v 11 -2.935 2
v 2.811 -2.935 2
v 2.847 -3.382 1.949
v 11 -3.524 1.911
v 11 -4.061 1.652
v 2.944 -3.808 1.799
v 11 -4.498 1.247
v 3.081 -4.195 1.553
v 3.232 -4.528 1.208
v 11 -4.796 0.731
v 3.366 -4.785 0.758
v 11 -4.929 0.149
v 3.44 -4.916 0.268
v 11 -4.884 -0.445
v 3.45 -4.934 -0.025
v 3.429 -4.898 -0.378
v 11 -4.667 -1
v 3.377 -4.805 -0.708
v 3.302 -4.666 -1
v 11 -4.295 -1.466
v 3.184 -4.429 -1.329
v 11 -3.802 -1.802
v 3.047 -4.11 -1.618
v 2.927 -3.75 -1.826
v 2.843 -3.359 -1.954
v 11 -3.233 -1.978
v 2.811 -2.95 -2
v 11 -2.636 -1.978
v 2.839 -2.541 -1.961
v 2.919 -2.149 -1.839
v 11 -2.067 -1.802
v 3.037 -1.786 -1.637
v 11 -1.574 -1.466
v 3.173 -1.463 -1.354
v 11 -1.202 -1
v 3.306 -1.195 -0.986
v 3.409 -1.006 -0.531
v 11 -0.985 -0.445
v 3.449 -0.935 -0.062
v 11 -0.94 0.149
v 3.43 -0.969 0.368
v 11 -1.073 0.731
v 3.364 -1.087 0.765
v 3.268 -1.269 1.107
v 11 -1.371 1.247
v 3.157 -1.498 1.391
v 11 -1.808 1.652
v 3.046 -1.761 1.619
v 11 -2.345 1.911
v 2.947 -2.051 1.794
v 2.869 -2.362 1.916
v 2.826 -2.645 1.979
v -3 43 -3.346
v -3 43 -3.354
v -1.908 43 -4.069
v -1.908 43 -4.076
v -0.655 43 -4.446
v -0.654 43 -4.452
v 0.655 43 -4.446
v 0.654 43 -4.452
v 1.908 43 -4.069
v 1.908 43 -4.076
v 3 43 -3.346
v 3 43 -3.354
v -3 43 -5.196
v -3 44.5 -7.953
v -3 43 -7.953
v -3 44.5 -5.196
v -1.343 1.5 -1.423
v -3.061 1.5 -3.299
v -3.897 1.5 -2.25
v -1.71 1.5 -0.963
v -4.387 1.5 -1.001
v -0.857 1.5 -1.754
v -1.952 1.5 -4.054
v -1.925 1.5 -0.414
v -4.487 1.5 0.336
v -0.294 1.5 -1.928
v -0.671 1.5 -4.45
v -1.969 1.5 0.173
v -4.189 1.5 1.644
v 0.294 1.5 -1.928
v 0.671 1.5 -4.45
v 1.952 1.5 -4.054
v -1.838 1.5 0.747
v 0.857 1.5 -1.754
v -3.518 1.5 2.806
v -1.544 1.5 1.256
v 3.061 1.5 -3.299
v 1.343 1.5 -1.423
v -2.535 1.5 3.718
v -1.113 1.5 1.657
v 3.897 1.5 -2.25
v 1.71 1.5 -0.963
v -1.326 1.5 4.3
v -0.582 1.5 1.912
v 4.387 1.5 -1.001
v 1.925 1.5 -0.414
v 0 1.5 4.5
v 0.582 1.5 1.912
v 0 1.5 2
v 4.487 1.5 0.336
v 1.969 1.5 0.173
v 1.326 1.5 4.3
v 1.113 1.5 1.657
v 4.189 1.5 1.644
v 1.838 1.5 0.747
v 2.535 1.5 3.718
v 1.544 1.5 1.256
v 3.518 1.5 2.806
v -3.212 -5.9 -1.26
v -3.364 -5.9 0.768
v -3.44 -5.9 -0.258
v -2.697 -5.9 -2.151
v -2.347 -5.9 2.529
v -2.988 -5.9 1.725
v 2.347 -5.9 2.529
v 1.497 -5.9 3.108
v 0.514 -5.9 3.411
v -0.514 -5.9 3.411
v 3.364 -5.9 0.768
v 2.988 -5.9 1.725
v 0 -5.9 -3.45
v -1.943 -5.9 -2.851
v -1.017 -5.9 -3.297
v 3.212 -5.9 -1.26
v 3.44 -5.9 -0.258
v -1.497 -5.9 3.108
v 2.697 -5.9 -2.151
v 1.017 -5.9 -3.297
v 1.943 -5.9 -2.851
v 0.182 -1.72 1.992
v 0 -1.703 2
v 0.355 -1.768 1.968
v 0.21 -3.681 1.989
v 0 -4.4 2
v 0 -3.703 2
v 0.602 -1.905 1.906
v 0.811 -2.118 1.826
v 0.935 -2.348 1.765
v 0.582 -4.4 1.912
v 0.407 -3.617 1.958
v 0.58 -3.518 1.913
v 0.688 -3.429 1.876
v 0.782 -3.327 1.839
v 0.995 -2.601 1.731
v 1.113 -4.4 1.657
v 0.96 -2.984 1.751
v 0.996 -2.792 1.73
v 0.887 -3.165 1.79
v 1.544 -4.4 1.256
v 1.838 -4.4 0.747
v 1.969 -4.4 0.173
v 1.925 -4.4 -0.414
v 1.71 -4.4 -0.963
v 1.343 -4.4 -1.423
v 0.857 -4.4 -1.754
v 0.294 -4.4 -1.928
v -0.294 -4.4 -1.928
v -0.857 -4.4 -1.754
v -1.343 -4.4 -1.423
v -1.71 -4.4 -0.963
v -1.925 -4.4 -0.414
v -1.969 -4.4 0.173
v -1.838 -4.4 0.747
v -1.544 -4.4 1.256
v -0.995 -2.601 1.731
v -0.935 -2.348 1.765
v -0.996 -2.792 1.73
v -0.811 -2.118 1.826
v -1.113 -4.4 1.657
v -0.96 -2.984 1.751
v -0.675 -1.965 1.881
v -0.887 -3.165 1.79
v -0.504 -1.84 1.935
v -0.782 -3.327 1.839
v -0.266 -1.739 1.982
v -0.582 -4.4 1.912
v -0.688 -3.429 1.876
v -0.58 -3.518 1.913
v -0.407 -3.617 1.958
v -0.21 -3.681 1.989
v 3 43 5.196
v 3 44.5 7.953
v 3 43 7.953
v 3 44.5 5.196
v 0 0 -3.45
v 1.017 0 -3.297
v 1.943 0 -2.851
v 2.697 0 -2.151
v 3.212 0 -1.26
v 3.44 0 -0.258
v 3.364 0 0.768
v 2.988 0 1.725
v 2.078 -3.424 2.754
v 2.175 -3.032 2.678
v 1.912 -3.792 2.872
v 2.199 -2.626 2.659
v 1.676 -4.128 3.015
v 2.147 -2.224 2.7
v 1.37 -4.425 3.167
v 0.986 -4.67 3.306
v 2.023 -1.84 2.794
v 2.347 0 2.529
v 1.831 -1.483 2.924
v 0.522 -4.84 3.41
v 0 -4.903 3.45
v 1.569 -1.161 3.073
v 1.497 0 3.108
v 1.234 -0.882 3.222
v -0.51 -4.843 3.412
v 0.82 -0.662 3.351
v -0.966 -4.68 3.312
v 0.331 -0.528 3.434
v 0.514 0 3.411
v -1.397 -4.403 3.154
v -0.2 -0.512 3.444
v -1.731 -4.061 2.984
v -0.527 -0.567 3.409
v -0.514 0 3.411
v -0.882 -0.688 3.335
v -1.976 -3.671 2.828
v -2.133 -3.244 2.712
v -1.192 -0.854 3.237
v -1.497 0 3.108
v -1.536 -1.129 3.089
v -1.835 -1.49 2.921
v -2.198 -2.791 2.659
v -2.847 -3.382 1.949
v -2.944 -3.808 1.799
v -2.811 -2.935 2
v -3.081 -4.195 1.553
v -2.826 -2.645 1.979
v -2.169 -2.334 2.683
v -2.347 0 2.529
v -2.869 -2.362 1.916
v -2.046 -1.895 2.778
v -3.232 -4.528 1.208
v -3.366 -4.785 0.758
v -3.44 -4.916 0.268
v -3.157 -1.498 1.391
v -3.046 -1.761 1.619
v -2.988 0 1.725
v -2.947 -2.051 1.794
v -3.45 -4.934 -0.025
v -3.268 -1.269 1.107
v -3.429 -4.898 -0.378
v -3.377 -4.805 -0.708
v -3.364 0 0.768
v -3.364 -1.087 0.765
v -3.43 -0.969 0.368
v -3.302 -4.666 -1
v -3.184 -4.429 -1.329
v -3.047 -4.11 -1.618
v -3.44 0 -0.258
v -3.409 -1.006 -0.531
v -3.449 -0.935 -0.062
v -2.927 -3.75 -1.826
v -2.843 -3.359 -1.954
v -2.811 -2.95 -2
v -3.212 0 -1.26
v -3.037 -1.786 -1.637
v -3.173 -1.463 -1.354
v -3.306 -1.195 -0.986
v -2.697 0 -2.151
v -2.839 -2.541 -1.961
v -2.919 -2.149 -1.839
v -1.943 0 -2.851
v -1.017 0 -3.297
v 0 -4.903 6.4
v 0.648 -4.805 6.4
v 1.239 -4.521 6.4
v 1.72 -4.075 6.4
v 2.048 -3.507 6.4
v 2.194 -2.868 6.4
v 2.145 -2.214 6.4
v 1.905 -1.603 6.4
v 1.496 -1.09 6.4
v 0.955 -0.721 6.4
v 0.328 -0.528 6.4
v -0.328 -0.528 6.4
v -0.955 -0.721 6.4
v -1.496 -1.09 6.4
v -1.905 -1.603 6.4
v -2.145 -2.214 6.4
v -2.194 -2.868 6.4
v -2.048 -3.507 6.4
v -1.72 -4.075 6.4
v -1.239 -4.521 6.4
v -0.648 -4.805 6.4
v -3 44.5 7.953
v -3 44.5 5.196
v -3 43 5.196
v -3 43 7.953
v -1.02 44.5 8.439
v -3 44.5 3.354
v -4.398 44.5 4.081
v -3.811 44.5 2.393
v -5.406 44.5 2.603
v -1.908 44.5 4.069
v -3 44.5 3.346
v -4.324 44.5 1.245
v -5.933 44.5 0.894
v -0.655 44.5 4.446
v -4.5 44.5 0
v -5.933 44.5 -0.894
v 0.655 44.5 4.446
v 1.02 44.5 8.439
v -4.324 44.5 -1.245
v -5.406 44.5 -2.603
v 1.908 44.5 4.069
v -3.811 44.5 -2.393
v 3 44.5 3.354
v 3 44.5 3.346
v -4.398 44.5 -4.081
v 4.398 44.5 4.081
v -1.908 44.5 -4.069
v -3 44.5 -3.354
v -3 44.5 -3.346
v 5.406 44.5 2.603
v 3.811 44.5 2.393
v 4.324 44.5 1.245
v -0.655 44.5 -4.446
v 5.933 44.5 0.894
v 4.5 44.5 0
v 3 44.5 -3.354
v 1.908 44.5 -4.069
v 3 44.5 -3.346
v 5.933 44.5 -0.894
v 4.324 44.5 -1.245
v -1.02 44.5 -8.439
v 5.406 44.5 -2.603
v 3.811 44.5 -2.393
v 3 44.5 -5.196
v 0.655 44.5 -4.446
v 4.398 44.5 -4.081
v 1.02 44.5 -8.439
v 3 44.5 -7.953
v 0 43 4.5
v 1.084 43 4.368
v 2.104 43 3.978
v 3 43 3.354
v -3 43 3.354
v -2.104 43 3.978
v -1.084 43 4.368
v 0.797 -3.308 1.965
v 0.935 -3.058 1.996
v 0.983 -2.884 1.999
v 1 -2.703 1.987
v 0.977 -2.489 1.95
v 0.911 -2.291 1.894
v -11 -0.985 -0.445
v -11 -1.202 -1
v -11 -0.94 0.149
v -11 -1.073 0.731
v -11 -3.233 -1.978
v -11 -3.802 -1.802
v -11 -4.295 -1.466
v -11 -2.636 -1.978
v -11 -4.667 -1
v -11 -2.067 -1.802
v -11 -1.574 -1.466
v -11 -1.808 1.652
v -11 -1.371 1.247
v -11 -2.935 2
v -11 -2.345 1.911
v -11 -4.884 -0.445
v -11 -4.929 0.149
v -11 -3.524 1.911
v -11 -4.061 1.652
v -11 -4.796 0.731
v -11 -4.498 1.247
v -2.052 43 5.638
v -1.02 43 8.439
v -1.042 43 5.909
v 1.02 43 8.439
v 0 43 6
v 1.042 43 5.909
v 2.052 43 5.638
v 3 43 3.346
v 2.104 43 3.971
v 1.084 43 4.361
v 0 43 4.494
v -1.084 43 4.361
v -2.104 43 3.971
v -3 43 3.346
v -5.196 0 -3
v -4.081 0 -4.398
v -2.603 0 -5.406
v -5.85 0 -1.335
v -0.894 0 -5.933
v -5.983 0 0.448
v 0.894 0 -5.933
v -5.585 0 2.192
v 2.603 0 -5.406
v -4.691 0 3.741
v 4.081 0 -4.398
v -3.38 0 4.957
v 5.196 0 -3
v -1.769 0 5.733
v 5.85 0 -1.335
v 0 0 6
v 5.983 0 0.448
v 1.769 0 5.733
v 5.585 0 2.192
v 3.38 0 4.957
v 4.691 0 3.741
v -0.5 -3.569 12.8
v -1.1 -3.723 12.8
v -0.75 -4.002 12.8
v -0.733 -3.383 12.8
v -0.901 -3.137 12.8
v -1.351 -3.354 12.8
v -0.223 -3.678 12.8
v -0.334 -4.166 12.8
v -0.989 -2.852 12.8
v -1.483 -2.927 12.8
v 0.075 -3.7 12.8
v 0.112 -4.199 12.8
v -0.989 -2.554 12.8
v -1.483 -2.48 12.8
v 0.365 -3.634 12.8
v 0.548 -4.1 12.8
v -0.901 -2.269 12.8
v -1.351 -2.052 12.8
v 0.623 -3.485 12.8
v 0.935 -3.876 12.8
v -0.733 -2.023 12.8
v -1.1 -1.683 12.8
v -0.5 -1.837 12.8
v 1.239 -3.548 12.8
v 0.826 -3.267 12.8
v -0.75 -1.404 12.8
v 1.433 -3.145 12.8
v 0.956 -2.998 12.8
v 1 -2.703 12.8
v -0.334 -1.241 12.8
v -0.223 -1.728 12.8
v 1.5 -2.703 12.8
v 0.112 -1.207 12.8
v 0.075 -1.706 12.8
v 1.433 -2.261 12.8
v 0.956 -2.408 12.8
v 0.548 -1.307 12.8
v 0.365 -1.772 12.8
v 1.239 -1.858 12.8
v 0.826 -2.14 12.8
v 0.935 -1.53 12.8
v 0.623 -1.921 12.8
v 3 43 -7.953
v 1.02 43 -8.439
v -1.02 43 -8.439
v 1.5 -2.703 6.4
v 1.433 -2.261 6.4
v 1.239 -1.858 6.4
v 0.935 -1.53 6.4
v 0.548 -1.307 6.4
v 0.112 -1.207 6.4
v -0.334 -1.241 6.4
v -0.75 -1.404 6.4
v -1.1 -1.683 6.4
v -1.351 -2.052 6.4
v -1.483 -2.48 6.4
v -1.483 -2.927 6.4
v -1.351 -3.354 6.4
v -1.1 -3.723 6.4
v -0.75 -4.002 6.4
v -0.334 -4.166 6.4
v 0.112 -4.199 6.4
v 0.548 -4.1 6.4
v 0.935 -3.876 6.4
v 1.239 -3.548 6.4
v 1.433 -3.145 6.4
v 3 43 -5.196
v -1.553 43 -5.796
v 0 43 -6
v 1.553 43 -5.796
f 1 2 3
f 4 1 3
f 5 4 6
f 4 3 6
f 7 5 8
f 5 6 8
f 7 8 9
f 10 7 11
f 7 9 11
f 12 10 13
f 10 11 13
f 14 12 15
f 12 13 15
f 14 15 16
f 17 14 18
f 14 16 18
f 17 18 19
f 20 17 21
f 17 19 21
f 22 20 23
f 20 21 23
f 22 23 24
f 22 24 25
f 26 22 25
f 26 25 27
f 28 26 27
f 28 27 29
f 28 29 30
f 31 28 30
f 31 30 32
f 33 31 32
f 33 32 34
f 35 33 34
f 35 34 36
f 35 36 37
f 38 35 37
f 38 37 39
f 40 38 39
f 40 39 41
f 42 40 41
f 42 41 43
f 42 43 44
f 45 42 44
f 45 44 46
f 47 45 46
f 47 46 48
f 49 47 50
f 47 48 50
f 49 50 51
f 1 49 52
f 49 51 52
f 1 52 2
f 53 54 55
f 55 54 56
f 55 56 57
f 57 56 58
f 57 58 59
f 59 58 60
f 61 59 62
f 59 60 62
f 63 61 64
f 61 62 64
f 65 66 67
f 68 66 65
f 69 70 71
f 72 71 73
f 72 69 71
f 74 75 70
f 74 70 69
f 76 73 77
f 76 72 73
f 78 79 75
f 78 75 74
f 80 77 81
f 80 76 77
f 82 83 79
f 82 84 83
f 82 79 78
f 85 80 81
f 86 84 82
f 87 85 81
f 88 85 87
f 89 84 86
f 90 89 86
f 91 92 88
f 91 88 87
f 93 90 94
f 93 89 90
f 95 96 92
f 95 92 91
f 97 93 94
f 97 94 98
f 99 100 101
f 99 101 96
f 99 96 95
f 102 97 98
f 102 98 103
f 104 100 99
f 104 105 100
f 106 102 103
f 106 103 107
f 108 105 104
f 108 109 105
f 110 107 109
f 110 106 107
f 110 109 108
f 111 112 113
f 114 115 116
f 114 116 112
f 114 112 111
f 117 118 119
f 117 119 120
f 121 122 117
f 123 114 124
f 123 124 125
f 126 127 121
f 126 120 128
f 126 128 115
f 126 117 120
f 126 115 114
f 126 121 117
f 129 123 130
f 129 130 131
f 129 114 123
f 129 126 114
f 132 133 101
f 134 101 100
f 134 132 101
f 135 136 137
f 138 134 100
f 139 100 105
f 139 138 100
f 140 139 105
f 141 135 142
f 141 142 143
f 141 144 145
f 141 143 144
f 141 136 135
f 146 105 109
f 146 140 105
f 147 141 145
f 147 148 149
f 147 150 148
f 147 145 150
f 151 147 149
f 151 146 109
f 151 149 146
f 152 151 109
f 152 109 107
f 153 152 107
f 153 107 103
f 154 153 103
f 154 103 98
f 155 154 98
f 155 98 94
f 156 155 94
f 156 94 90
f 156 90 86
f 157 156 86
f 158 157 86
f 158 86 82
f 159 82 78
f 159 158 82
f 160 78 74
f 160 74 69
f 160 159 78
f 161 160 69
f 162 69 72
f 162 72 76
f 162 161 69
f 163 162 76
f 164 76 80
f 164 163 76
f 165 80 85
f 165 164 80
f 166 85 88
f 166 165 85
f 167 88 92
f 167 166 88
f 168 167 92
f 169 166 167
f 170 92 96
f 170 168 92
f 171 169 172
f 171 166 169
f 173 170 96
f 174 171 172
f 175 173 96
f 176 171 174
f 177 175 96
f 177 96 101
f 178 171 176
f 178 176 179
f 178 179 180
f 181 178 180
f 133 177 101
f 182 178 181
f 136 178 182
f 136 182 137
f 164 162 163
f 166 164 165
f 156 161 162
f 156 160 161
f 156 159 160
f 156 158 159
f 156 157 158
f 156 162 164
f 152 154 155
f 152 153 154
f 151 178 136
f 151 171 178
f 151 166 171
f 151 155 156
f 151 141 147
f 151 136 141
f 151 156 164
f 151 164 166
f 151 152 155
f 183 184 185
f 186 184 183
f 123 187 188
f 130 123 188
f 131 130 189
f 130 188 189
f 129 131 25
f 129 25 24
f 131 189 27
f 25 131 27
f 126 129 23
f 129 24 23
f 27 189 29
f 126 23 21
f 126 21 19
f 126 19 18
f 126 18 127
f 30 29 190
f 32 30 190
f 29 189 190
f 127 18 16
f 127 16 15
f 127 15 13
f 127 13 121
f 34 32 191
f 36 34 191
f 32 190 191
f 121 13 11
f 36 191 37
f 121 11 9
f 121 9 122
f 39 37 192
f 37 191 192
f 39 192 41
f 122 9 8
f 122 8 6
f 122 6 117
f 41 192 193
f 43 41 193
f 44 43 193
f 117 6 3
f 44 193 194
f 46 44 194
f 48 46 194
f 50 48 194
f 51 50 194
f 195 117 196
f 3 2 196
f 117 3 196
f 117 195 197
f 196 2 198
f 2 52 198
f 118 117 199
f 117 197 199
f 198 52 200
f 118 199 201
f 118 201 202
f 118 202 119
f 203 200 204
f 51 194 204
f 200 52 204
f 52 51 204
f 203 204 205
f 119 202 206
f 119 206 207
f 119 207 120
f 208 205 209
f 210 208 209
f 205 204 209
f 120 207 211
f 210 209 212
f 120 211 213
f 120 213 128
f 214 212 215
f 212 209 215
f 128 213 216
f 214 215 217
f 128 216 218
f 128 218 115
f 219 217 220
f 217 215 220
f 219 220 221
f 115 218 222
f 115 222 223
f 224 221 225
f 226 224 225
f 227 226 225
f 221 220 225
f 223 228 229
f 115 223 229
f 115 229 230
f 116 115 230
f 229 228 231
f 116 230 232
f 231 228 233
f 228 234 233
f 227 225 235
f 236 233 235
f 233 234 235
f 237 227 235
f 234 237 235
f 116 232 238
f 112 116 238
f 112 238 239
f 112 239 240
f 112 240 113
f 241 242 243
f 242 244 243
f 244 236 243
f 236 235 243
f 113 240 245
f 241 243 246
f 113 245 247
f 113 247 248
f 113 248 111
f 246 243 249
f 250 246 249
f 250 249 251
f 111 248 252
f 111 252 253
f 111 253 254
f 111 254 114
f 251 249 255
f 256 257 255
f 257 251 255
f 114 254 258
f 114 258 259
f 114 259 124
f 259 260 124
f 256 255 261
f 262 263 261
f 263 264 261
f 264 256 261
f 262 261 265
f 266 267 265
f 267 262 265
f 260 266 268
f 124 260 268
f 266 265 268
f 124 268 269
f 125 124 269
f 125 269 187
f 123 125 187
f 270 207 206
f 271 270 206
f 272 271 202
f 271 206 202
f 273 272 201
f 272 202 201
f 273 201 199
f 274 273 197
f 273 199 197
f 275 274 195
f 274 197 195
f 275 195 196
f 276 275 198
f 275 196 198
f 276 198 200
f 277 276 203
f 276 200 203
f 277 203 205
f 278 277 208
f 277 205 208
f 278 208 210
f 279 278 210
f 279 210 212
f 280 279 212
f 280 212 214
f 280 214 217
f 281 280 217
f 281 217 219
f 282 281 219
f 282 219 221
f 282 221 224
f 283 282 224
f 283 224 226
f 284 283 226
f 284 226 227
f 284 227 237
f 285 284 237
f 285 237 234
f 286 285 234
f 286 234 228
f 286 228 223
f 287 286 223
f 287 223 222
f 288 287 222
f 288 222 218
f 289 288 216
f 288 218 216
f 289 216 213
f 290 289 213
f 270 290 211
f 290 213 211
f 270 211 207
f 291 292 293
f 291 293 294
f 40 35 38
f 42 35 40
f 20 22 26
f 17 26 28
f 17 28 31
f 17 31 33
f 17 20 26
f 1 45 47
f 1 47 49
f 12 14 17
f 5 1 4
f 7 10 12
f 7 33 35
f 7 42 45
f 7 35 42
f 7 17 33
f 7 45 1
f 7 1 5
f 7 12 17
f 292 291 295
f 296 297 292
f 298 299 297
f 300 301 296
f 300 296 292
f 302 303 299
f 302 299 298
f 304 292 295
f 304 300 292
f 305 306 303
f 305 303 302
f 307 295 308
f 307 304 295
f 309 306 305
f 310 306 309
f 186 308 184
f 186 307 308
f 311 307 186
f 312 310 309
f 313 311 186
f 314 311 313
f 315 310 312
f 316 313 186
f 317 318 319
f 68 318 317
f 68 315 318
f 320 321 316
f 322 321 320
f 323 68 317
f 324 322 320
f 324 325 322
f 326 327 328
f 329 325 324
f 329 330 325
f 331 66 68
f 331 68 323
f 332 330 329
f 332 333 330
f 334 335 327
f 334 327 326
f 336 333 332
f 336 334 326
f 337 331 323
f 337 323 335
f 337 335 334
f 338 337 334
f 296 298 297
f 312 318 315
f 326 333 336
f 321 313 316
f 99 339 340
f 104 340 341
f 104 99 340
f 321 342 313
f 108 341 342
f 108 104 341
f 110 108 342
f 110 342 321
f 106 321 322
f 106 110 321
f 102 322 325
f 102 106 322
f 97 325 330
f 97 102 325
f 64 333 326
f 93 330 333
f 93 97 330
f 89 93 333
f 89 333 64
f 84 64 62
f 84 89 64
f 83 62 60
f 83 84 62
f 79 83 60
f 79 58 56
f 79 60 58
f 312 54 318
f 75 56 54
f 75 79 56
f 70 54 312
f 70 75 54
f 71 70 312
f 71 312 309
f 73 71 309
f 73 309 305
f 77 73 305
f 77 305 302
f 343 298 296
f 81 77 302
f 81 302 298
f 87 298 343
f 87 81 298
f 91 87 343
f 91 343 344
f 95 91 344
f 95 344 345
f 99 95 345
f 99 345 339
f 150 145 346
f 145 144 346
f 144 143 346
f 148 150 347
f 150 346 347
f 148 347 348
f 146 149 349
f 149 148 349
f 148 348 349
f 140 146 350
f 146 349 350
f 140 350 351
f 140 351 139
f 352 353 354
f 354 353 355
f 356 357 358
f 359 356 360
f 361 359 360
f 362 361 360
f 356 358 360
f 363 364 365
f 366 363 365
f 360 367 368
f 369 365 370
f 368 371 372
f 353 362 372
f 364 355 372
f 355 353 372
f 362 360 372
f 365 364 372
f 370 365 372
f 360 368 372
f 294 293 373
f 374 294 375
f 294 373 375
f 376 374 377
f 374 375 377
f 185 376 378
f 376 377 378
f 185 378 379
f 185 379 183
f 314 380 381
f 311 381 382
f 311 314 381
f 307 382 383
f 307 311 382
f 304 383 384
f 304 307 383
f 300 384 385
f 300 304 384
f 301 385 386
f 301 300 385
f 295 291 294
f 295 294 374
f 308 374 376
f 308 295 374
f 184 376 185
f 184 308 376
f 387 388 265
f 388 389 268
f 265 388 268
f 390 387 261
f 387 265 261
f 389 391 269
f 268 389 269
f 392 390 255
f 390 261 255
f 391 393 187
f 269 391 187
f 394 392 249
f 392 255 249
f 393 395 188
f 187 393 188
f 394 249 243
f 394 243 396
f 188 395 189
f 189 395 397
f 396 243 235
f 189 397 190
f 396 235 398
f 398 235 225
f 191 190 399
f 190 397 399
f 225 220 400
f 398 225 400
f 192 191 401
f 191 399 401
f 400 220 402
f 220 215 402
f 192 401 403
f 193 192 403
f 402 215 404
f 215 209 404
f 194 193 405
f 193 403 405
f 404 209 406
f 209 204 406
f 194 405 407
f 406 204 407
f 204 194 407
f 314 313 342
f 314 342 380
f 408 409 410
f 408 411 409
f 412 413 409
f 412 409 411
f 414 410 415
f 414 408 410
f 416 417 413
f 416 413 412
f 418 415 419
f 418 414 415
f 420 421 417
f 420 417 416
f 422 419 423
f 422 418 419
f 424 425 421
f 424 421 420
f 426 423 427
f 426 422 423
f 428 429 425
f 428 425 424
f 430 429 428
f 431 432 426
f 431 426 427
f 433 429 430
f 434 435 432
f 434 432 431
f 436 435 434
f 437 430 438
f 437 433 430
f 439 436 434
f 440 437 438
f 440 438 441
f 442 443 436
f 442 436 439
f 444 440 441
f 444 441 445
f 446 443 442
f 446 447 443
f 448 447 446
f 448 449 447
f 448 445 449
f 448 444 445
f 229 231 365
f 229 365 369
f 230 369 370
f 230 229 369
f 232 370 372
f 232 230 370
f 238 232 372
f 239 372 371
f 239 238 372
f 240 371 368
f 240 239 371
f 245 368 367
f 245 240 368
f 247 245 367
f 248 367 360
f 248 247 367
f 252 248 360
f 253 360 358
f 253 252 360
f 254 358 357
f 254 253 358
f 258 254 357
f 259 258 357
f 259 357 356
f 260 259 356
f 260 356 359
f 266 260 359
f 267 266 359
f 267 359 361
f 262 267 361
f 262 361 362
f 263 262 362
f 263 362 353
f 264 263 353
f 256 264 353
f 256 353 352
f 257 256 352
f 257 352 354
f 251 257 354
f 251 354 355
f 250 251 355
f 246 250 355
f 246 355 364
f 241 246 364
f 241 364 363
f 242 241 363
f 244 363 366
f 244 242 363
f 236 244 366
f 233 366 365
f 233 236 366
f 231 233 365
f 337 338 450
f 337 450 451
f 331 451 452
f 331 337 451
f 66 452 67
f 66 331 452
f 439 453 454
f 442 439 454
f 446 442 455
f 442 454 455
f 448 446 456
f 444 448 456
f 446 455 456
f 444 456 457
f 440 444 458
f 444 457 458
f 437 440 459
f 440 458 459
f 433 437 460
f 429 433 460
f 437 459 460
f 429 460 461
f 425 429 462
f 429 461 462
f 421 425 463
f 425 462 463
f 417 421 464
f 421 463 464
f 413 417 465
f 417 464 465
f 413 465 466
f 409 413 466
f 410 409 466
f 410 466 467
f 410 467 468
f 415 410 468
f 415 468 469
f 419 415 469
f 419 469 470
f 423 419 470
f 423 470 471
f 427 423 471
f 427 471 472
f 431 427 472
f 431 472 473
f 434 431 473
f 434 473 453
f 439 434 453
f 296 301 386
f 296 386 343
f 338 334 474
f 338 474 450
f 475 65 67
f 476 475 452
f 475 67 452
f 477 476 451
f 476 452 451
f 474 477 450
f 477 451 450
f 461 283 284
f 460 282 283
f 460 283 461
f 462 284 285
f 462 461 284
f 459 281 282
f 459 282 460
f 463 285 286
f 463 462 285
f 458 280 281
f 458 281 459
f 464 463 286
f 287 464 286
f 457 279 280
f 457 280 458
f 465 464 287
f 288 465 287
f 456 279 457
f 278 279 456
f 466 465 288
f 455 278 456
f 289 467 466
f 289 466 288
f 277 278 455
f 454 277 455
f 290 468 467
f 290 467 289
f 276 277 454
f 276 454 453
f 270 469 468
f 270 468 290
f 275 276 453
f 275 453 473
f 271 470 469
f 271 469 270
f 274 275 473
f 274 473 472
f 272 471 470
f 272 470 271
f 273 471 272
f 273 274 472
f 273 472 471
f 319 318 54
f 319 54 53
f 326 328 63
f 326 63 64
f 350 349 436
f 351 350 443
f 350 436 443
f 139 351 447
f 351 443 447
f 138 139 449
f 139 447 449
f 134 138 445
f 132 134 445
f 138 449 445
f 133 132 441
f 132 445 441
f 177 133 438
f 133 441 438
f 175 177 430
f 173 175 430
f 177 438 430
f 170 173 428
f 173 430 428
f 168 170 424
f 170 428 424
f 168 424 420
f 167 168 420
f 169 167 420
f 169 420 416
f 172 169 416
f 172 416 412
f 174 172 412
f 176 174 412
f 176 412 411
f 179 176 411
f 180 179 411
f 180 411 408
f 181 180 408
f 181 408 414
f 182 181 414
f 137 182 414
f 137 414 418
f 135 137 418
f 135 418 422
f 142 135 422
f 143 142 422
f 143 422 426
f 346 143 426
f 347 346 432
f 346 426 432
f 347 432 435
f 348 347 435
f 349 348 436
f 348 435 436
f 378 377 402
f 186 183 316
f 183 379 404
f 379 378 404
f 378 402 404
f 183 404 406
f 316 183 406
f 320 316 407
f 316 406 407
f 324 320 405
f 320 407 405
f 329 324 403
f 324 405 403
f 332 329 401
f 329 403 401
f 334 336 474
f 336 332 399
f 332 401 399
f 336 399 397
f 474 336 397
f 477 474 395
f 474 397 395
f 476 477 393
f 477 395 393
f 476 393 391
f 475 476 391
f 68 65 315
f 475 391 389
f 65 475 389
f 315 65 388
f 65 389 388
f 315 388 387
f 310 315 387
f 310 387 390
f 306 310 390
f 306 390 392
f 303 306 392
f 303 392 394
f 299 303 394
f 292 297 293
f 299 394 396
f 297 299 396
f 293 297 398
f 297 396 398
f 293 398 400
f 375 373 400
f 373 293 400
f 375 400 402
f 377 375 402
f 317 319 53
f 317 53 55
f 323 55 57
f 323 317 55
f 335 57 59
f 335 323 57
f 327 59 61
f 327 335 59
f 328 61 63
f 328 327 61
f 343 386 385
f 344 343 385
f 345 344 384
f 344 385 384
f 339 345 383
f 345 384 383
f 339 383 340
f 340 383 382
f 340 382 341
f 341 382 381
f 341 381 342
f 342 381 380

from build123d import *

# Parameters (mm, degrees)
SKETCH1_R           = 6
BOSS_EXTRUDE1_DEPTH = 44.5
SHELL1_T            = -1.5
SKETCH3_R           = 3.45
BOSS_EXTRUDE3_DEPTH = 5.9
SHELL2_START        = -4.4
SHELL2_OUTLINE_R    = 1.95
SHELL2_DEPTH        = 5.9
SKETCH5_R           = 2.2
BOSS_EXTRUDE4_DEPTH = 6.4
SKETCH6_R           = 1.5
BOSS_EXTRUDE5_DEPTH = 6.4
SKETCH7_R           = 1
CUT_EXTRUDE1_DEPTH  = 12.4
SKETCH8_R           = 1.95
CUT_EXTRUDE2_DEPTH  = 51.902357509
SKETCH9_R           = 2
BOSS_EXTRUDE6_DEPTH = 11
SKETCH10_R          = 1.975
CUT_EXTRUDE3_DEPTH  = 52.730551947
SKETCH11_R          = 1
CUT_EXTRUDE4_DEPTH  = 12
BOSS_EXTRUDE9_DEPTH = 1.5


# Read off the part's stored shape, not the designer's step: Shell2
with BuildPart() as part:
    # Sketch1 → Boss-Extrude1 (new body)
    with BuildSketch(Plane(origin=(0, 0, 0), x_dir=(1, 0, 0), z_dir=(0, 1, 0))):
        with Locations(Location((0, 0, 0), (0, 0, 270))):
            Circle(SKETCH1_R)
    extrude(amount=BOSS_EXTRUDE1_DEPTH)

    # Shell1
    shell1_openings = [part.faces().sort_by_distance(p)[0] for p in [
        (0, 44.5, 0),
    ]]
    offset(amount=SHELL1_T, openings=shell1_openings, kind=Kind.INTERSECTION)

    # Sketch3 → Boss-Extrude3 (add)
    with BuildSketch(Plane.XZ):
        with Locations(Location((0, 0, 0), (0, 0, 270))):
            Circle(SKETCH3_R)
    extrude(amount=BOSS_EXTRUDE3_DEPTH)

    # Shell2 outline → Shell2 (cut)
    with BuildSketch(Plane(origin=(0, 0, 0), x_dir=(1, 0, 0), z_dir=(0, 1, 0)).offset(SHELL2_START)):
        Circle(SHELL2_OUTLINE_R)
    extrude(amount=SHELL2_DEPTH, mode=Mode.SUBTRACT)

    # Sketch5 → Boss-Extrude4 (add)
    with BuildSketch(Plane.XY):
        with Locations(Location((0, -2.70320485, 0), (0, 0, 270))):
            Circle(SKETCH5_R)
    extrude(amount=BOSS_EXTRUDE4_DEPTH)

    # Sketch6 → Boss-Extrude5 (add)
    with BuildSketch(Plane.XY.offset(6.4)):
        with Locations((0, -2.70320485)):
            Circle(SKETCH6_R)
    extrude(amount=BOSS_EXTRUDE5_DEPTH)

    # Sketch7 → Cut-Extrude1 (cut)
    with BuildSketch(Plane.XY.offset(12.8)):
        with Locations((0, -2.70320485)):
            Circle(SKETCH7_R)
    extrude(amount=-CUT_EXTRUDE1_DEPTH, mode=Mode.SUBTRACT)

    # Sketch8 → Cut-Extrude2 (cut, through all)
    with BuildSketch(Plane(origin=(0, -4.4, 0), x_dir=(1, 0, 0), z_dir=(0, 1, 0))):
        with Locations(Location((0, 0, 0), (0, 0, 270))):
            Circle(SKETCH8_R)
    extrude(amount=CUT_EXTRUDE2_DEPTH, mode=Mode.SUBTRACT)

    # Sketch9 → Boss-Extrude6 (add)
    with BuildSketch(Plane(origin=(0, 0, 0), x_dir=(0, 0, -1), z_dir=(1, 0, 0))):
        with Locations(Location((0, -2.934503104, 0), (0, 0, 180))):
            Circle(SKETCH9_R)
    extrude(amount=BOSS_EXTRUDE6_DEPTH)

    # Sketch10 → Cut-Extrude3 (cut, through all)
    with BuildSketch(Plane(origin=(0, -4.4, 0), x_dir=(1, 0, 0), z_dir=(0, 1, 0))):
        with Locations(Location((0, -0.025, 0), (0, 0, 270))):
            Circle(SKETCH10_R)
    extrude(amount=CUT_EXTRUDE3_DEPTH, mode=Mode.SUBTRACT)

    # Sketch11 → Cut-Extrude4 (cut)
    with BuildSketch(Plane.XY.offset(12.8)):
        with Locations((0, -2.70320485)):
            Circle(SKETCH11_R)
    extrude(amount=-CUT_EXTRUDE4_DEPTH, mode=Mode.SUBTRACT)

    # Mirror5: part across plane


with BuildPart() as part_1:
    add(part.part)
    add(part.part.mirror(Plane(origin=(0, 0, 0), x_dir=(0, 0, 1), z_dir=(1, 0, 0))))

    # Sketch14 → Boss-Extrude9 (add)
    with BuildSketch(Plane(origin=(0, 44.5, 0), x_dir=(1, 0, 0), z_dir=(0, 1, 0))):
        with BuildLine():
            Line((-3, -3.346313625), (-3, -7.95298686))
            ThreePointArc((-3, -7.95298686), (0, -8.5), (3, -7.95298686))
            Line((3, -7.95298686), (3, -3.346313625))
            ThreePointArc((3, -3.346313625), (0, -4.494197912), (-3, -3.346313625))
        make_face()
        with BuildLine():
            Line((3, 3.346313625), (3, 7.95298686))
            ThreePointArc((3, 7.95298686), (0, 8.5), (-3, 7.95298686))
            Line((-3, 7.95298686), (-3, 3.346313625))
            ThreePointArc((-3, 3.346313625), (0, 4.494197912), (3, 3.346313625))
        make_face()
    extrude(amount=-BOSS_EXTRUDE9_DEPTH)


solid = part_1.part
